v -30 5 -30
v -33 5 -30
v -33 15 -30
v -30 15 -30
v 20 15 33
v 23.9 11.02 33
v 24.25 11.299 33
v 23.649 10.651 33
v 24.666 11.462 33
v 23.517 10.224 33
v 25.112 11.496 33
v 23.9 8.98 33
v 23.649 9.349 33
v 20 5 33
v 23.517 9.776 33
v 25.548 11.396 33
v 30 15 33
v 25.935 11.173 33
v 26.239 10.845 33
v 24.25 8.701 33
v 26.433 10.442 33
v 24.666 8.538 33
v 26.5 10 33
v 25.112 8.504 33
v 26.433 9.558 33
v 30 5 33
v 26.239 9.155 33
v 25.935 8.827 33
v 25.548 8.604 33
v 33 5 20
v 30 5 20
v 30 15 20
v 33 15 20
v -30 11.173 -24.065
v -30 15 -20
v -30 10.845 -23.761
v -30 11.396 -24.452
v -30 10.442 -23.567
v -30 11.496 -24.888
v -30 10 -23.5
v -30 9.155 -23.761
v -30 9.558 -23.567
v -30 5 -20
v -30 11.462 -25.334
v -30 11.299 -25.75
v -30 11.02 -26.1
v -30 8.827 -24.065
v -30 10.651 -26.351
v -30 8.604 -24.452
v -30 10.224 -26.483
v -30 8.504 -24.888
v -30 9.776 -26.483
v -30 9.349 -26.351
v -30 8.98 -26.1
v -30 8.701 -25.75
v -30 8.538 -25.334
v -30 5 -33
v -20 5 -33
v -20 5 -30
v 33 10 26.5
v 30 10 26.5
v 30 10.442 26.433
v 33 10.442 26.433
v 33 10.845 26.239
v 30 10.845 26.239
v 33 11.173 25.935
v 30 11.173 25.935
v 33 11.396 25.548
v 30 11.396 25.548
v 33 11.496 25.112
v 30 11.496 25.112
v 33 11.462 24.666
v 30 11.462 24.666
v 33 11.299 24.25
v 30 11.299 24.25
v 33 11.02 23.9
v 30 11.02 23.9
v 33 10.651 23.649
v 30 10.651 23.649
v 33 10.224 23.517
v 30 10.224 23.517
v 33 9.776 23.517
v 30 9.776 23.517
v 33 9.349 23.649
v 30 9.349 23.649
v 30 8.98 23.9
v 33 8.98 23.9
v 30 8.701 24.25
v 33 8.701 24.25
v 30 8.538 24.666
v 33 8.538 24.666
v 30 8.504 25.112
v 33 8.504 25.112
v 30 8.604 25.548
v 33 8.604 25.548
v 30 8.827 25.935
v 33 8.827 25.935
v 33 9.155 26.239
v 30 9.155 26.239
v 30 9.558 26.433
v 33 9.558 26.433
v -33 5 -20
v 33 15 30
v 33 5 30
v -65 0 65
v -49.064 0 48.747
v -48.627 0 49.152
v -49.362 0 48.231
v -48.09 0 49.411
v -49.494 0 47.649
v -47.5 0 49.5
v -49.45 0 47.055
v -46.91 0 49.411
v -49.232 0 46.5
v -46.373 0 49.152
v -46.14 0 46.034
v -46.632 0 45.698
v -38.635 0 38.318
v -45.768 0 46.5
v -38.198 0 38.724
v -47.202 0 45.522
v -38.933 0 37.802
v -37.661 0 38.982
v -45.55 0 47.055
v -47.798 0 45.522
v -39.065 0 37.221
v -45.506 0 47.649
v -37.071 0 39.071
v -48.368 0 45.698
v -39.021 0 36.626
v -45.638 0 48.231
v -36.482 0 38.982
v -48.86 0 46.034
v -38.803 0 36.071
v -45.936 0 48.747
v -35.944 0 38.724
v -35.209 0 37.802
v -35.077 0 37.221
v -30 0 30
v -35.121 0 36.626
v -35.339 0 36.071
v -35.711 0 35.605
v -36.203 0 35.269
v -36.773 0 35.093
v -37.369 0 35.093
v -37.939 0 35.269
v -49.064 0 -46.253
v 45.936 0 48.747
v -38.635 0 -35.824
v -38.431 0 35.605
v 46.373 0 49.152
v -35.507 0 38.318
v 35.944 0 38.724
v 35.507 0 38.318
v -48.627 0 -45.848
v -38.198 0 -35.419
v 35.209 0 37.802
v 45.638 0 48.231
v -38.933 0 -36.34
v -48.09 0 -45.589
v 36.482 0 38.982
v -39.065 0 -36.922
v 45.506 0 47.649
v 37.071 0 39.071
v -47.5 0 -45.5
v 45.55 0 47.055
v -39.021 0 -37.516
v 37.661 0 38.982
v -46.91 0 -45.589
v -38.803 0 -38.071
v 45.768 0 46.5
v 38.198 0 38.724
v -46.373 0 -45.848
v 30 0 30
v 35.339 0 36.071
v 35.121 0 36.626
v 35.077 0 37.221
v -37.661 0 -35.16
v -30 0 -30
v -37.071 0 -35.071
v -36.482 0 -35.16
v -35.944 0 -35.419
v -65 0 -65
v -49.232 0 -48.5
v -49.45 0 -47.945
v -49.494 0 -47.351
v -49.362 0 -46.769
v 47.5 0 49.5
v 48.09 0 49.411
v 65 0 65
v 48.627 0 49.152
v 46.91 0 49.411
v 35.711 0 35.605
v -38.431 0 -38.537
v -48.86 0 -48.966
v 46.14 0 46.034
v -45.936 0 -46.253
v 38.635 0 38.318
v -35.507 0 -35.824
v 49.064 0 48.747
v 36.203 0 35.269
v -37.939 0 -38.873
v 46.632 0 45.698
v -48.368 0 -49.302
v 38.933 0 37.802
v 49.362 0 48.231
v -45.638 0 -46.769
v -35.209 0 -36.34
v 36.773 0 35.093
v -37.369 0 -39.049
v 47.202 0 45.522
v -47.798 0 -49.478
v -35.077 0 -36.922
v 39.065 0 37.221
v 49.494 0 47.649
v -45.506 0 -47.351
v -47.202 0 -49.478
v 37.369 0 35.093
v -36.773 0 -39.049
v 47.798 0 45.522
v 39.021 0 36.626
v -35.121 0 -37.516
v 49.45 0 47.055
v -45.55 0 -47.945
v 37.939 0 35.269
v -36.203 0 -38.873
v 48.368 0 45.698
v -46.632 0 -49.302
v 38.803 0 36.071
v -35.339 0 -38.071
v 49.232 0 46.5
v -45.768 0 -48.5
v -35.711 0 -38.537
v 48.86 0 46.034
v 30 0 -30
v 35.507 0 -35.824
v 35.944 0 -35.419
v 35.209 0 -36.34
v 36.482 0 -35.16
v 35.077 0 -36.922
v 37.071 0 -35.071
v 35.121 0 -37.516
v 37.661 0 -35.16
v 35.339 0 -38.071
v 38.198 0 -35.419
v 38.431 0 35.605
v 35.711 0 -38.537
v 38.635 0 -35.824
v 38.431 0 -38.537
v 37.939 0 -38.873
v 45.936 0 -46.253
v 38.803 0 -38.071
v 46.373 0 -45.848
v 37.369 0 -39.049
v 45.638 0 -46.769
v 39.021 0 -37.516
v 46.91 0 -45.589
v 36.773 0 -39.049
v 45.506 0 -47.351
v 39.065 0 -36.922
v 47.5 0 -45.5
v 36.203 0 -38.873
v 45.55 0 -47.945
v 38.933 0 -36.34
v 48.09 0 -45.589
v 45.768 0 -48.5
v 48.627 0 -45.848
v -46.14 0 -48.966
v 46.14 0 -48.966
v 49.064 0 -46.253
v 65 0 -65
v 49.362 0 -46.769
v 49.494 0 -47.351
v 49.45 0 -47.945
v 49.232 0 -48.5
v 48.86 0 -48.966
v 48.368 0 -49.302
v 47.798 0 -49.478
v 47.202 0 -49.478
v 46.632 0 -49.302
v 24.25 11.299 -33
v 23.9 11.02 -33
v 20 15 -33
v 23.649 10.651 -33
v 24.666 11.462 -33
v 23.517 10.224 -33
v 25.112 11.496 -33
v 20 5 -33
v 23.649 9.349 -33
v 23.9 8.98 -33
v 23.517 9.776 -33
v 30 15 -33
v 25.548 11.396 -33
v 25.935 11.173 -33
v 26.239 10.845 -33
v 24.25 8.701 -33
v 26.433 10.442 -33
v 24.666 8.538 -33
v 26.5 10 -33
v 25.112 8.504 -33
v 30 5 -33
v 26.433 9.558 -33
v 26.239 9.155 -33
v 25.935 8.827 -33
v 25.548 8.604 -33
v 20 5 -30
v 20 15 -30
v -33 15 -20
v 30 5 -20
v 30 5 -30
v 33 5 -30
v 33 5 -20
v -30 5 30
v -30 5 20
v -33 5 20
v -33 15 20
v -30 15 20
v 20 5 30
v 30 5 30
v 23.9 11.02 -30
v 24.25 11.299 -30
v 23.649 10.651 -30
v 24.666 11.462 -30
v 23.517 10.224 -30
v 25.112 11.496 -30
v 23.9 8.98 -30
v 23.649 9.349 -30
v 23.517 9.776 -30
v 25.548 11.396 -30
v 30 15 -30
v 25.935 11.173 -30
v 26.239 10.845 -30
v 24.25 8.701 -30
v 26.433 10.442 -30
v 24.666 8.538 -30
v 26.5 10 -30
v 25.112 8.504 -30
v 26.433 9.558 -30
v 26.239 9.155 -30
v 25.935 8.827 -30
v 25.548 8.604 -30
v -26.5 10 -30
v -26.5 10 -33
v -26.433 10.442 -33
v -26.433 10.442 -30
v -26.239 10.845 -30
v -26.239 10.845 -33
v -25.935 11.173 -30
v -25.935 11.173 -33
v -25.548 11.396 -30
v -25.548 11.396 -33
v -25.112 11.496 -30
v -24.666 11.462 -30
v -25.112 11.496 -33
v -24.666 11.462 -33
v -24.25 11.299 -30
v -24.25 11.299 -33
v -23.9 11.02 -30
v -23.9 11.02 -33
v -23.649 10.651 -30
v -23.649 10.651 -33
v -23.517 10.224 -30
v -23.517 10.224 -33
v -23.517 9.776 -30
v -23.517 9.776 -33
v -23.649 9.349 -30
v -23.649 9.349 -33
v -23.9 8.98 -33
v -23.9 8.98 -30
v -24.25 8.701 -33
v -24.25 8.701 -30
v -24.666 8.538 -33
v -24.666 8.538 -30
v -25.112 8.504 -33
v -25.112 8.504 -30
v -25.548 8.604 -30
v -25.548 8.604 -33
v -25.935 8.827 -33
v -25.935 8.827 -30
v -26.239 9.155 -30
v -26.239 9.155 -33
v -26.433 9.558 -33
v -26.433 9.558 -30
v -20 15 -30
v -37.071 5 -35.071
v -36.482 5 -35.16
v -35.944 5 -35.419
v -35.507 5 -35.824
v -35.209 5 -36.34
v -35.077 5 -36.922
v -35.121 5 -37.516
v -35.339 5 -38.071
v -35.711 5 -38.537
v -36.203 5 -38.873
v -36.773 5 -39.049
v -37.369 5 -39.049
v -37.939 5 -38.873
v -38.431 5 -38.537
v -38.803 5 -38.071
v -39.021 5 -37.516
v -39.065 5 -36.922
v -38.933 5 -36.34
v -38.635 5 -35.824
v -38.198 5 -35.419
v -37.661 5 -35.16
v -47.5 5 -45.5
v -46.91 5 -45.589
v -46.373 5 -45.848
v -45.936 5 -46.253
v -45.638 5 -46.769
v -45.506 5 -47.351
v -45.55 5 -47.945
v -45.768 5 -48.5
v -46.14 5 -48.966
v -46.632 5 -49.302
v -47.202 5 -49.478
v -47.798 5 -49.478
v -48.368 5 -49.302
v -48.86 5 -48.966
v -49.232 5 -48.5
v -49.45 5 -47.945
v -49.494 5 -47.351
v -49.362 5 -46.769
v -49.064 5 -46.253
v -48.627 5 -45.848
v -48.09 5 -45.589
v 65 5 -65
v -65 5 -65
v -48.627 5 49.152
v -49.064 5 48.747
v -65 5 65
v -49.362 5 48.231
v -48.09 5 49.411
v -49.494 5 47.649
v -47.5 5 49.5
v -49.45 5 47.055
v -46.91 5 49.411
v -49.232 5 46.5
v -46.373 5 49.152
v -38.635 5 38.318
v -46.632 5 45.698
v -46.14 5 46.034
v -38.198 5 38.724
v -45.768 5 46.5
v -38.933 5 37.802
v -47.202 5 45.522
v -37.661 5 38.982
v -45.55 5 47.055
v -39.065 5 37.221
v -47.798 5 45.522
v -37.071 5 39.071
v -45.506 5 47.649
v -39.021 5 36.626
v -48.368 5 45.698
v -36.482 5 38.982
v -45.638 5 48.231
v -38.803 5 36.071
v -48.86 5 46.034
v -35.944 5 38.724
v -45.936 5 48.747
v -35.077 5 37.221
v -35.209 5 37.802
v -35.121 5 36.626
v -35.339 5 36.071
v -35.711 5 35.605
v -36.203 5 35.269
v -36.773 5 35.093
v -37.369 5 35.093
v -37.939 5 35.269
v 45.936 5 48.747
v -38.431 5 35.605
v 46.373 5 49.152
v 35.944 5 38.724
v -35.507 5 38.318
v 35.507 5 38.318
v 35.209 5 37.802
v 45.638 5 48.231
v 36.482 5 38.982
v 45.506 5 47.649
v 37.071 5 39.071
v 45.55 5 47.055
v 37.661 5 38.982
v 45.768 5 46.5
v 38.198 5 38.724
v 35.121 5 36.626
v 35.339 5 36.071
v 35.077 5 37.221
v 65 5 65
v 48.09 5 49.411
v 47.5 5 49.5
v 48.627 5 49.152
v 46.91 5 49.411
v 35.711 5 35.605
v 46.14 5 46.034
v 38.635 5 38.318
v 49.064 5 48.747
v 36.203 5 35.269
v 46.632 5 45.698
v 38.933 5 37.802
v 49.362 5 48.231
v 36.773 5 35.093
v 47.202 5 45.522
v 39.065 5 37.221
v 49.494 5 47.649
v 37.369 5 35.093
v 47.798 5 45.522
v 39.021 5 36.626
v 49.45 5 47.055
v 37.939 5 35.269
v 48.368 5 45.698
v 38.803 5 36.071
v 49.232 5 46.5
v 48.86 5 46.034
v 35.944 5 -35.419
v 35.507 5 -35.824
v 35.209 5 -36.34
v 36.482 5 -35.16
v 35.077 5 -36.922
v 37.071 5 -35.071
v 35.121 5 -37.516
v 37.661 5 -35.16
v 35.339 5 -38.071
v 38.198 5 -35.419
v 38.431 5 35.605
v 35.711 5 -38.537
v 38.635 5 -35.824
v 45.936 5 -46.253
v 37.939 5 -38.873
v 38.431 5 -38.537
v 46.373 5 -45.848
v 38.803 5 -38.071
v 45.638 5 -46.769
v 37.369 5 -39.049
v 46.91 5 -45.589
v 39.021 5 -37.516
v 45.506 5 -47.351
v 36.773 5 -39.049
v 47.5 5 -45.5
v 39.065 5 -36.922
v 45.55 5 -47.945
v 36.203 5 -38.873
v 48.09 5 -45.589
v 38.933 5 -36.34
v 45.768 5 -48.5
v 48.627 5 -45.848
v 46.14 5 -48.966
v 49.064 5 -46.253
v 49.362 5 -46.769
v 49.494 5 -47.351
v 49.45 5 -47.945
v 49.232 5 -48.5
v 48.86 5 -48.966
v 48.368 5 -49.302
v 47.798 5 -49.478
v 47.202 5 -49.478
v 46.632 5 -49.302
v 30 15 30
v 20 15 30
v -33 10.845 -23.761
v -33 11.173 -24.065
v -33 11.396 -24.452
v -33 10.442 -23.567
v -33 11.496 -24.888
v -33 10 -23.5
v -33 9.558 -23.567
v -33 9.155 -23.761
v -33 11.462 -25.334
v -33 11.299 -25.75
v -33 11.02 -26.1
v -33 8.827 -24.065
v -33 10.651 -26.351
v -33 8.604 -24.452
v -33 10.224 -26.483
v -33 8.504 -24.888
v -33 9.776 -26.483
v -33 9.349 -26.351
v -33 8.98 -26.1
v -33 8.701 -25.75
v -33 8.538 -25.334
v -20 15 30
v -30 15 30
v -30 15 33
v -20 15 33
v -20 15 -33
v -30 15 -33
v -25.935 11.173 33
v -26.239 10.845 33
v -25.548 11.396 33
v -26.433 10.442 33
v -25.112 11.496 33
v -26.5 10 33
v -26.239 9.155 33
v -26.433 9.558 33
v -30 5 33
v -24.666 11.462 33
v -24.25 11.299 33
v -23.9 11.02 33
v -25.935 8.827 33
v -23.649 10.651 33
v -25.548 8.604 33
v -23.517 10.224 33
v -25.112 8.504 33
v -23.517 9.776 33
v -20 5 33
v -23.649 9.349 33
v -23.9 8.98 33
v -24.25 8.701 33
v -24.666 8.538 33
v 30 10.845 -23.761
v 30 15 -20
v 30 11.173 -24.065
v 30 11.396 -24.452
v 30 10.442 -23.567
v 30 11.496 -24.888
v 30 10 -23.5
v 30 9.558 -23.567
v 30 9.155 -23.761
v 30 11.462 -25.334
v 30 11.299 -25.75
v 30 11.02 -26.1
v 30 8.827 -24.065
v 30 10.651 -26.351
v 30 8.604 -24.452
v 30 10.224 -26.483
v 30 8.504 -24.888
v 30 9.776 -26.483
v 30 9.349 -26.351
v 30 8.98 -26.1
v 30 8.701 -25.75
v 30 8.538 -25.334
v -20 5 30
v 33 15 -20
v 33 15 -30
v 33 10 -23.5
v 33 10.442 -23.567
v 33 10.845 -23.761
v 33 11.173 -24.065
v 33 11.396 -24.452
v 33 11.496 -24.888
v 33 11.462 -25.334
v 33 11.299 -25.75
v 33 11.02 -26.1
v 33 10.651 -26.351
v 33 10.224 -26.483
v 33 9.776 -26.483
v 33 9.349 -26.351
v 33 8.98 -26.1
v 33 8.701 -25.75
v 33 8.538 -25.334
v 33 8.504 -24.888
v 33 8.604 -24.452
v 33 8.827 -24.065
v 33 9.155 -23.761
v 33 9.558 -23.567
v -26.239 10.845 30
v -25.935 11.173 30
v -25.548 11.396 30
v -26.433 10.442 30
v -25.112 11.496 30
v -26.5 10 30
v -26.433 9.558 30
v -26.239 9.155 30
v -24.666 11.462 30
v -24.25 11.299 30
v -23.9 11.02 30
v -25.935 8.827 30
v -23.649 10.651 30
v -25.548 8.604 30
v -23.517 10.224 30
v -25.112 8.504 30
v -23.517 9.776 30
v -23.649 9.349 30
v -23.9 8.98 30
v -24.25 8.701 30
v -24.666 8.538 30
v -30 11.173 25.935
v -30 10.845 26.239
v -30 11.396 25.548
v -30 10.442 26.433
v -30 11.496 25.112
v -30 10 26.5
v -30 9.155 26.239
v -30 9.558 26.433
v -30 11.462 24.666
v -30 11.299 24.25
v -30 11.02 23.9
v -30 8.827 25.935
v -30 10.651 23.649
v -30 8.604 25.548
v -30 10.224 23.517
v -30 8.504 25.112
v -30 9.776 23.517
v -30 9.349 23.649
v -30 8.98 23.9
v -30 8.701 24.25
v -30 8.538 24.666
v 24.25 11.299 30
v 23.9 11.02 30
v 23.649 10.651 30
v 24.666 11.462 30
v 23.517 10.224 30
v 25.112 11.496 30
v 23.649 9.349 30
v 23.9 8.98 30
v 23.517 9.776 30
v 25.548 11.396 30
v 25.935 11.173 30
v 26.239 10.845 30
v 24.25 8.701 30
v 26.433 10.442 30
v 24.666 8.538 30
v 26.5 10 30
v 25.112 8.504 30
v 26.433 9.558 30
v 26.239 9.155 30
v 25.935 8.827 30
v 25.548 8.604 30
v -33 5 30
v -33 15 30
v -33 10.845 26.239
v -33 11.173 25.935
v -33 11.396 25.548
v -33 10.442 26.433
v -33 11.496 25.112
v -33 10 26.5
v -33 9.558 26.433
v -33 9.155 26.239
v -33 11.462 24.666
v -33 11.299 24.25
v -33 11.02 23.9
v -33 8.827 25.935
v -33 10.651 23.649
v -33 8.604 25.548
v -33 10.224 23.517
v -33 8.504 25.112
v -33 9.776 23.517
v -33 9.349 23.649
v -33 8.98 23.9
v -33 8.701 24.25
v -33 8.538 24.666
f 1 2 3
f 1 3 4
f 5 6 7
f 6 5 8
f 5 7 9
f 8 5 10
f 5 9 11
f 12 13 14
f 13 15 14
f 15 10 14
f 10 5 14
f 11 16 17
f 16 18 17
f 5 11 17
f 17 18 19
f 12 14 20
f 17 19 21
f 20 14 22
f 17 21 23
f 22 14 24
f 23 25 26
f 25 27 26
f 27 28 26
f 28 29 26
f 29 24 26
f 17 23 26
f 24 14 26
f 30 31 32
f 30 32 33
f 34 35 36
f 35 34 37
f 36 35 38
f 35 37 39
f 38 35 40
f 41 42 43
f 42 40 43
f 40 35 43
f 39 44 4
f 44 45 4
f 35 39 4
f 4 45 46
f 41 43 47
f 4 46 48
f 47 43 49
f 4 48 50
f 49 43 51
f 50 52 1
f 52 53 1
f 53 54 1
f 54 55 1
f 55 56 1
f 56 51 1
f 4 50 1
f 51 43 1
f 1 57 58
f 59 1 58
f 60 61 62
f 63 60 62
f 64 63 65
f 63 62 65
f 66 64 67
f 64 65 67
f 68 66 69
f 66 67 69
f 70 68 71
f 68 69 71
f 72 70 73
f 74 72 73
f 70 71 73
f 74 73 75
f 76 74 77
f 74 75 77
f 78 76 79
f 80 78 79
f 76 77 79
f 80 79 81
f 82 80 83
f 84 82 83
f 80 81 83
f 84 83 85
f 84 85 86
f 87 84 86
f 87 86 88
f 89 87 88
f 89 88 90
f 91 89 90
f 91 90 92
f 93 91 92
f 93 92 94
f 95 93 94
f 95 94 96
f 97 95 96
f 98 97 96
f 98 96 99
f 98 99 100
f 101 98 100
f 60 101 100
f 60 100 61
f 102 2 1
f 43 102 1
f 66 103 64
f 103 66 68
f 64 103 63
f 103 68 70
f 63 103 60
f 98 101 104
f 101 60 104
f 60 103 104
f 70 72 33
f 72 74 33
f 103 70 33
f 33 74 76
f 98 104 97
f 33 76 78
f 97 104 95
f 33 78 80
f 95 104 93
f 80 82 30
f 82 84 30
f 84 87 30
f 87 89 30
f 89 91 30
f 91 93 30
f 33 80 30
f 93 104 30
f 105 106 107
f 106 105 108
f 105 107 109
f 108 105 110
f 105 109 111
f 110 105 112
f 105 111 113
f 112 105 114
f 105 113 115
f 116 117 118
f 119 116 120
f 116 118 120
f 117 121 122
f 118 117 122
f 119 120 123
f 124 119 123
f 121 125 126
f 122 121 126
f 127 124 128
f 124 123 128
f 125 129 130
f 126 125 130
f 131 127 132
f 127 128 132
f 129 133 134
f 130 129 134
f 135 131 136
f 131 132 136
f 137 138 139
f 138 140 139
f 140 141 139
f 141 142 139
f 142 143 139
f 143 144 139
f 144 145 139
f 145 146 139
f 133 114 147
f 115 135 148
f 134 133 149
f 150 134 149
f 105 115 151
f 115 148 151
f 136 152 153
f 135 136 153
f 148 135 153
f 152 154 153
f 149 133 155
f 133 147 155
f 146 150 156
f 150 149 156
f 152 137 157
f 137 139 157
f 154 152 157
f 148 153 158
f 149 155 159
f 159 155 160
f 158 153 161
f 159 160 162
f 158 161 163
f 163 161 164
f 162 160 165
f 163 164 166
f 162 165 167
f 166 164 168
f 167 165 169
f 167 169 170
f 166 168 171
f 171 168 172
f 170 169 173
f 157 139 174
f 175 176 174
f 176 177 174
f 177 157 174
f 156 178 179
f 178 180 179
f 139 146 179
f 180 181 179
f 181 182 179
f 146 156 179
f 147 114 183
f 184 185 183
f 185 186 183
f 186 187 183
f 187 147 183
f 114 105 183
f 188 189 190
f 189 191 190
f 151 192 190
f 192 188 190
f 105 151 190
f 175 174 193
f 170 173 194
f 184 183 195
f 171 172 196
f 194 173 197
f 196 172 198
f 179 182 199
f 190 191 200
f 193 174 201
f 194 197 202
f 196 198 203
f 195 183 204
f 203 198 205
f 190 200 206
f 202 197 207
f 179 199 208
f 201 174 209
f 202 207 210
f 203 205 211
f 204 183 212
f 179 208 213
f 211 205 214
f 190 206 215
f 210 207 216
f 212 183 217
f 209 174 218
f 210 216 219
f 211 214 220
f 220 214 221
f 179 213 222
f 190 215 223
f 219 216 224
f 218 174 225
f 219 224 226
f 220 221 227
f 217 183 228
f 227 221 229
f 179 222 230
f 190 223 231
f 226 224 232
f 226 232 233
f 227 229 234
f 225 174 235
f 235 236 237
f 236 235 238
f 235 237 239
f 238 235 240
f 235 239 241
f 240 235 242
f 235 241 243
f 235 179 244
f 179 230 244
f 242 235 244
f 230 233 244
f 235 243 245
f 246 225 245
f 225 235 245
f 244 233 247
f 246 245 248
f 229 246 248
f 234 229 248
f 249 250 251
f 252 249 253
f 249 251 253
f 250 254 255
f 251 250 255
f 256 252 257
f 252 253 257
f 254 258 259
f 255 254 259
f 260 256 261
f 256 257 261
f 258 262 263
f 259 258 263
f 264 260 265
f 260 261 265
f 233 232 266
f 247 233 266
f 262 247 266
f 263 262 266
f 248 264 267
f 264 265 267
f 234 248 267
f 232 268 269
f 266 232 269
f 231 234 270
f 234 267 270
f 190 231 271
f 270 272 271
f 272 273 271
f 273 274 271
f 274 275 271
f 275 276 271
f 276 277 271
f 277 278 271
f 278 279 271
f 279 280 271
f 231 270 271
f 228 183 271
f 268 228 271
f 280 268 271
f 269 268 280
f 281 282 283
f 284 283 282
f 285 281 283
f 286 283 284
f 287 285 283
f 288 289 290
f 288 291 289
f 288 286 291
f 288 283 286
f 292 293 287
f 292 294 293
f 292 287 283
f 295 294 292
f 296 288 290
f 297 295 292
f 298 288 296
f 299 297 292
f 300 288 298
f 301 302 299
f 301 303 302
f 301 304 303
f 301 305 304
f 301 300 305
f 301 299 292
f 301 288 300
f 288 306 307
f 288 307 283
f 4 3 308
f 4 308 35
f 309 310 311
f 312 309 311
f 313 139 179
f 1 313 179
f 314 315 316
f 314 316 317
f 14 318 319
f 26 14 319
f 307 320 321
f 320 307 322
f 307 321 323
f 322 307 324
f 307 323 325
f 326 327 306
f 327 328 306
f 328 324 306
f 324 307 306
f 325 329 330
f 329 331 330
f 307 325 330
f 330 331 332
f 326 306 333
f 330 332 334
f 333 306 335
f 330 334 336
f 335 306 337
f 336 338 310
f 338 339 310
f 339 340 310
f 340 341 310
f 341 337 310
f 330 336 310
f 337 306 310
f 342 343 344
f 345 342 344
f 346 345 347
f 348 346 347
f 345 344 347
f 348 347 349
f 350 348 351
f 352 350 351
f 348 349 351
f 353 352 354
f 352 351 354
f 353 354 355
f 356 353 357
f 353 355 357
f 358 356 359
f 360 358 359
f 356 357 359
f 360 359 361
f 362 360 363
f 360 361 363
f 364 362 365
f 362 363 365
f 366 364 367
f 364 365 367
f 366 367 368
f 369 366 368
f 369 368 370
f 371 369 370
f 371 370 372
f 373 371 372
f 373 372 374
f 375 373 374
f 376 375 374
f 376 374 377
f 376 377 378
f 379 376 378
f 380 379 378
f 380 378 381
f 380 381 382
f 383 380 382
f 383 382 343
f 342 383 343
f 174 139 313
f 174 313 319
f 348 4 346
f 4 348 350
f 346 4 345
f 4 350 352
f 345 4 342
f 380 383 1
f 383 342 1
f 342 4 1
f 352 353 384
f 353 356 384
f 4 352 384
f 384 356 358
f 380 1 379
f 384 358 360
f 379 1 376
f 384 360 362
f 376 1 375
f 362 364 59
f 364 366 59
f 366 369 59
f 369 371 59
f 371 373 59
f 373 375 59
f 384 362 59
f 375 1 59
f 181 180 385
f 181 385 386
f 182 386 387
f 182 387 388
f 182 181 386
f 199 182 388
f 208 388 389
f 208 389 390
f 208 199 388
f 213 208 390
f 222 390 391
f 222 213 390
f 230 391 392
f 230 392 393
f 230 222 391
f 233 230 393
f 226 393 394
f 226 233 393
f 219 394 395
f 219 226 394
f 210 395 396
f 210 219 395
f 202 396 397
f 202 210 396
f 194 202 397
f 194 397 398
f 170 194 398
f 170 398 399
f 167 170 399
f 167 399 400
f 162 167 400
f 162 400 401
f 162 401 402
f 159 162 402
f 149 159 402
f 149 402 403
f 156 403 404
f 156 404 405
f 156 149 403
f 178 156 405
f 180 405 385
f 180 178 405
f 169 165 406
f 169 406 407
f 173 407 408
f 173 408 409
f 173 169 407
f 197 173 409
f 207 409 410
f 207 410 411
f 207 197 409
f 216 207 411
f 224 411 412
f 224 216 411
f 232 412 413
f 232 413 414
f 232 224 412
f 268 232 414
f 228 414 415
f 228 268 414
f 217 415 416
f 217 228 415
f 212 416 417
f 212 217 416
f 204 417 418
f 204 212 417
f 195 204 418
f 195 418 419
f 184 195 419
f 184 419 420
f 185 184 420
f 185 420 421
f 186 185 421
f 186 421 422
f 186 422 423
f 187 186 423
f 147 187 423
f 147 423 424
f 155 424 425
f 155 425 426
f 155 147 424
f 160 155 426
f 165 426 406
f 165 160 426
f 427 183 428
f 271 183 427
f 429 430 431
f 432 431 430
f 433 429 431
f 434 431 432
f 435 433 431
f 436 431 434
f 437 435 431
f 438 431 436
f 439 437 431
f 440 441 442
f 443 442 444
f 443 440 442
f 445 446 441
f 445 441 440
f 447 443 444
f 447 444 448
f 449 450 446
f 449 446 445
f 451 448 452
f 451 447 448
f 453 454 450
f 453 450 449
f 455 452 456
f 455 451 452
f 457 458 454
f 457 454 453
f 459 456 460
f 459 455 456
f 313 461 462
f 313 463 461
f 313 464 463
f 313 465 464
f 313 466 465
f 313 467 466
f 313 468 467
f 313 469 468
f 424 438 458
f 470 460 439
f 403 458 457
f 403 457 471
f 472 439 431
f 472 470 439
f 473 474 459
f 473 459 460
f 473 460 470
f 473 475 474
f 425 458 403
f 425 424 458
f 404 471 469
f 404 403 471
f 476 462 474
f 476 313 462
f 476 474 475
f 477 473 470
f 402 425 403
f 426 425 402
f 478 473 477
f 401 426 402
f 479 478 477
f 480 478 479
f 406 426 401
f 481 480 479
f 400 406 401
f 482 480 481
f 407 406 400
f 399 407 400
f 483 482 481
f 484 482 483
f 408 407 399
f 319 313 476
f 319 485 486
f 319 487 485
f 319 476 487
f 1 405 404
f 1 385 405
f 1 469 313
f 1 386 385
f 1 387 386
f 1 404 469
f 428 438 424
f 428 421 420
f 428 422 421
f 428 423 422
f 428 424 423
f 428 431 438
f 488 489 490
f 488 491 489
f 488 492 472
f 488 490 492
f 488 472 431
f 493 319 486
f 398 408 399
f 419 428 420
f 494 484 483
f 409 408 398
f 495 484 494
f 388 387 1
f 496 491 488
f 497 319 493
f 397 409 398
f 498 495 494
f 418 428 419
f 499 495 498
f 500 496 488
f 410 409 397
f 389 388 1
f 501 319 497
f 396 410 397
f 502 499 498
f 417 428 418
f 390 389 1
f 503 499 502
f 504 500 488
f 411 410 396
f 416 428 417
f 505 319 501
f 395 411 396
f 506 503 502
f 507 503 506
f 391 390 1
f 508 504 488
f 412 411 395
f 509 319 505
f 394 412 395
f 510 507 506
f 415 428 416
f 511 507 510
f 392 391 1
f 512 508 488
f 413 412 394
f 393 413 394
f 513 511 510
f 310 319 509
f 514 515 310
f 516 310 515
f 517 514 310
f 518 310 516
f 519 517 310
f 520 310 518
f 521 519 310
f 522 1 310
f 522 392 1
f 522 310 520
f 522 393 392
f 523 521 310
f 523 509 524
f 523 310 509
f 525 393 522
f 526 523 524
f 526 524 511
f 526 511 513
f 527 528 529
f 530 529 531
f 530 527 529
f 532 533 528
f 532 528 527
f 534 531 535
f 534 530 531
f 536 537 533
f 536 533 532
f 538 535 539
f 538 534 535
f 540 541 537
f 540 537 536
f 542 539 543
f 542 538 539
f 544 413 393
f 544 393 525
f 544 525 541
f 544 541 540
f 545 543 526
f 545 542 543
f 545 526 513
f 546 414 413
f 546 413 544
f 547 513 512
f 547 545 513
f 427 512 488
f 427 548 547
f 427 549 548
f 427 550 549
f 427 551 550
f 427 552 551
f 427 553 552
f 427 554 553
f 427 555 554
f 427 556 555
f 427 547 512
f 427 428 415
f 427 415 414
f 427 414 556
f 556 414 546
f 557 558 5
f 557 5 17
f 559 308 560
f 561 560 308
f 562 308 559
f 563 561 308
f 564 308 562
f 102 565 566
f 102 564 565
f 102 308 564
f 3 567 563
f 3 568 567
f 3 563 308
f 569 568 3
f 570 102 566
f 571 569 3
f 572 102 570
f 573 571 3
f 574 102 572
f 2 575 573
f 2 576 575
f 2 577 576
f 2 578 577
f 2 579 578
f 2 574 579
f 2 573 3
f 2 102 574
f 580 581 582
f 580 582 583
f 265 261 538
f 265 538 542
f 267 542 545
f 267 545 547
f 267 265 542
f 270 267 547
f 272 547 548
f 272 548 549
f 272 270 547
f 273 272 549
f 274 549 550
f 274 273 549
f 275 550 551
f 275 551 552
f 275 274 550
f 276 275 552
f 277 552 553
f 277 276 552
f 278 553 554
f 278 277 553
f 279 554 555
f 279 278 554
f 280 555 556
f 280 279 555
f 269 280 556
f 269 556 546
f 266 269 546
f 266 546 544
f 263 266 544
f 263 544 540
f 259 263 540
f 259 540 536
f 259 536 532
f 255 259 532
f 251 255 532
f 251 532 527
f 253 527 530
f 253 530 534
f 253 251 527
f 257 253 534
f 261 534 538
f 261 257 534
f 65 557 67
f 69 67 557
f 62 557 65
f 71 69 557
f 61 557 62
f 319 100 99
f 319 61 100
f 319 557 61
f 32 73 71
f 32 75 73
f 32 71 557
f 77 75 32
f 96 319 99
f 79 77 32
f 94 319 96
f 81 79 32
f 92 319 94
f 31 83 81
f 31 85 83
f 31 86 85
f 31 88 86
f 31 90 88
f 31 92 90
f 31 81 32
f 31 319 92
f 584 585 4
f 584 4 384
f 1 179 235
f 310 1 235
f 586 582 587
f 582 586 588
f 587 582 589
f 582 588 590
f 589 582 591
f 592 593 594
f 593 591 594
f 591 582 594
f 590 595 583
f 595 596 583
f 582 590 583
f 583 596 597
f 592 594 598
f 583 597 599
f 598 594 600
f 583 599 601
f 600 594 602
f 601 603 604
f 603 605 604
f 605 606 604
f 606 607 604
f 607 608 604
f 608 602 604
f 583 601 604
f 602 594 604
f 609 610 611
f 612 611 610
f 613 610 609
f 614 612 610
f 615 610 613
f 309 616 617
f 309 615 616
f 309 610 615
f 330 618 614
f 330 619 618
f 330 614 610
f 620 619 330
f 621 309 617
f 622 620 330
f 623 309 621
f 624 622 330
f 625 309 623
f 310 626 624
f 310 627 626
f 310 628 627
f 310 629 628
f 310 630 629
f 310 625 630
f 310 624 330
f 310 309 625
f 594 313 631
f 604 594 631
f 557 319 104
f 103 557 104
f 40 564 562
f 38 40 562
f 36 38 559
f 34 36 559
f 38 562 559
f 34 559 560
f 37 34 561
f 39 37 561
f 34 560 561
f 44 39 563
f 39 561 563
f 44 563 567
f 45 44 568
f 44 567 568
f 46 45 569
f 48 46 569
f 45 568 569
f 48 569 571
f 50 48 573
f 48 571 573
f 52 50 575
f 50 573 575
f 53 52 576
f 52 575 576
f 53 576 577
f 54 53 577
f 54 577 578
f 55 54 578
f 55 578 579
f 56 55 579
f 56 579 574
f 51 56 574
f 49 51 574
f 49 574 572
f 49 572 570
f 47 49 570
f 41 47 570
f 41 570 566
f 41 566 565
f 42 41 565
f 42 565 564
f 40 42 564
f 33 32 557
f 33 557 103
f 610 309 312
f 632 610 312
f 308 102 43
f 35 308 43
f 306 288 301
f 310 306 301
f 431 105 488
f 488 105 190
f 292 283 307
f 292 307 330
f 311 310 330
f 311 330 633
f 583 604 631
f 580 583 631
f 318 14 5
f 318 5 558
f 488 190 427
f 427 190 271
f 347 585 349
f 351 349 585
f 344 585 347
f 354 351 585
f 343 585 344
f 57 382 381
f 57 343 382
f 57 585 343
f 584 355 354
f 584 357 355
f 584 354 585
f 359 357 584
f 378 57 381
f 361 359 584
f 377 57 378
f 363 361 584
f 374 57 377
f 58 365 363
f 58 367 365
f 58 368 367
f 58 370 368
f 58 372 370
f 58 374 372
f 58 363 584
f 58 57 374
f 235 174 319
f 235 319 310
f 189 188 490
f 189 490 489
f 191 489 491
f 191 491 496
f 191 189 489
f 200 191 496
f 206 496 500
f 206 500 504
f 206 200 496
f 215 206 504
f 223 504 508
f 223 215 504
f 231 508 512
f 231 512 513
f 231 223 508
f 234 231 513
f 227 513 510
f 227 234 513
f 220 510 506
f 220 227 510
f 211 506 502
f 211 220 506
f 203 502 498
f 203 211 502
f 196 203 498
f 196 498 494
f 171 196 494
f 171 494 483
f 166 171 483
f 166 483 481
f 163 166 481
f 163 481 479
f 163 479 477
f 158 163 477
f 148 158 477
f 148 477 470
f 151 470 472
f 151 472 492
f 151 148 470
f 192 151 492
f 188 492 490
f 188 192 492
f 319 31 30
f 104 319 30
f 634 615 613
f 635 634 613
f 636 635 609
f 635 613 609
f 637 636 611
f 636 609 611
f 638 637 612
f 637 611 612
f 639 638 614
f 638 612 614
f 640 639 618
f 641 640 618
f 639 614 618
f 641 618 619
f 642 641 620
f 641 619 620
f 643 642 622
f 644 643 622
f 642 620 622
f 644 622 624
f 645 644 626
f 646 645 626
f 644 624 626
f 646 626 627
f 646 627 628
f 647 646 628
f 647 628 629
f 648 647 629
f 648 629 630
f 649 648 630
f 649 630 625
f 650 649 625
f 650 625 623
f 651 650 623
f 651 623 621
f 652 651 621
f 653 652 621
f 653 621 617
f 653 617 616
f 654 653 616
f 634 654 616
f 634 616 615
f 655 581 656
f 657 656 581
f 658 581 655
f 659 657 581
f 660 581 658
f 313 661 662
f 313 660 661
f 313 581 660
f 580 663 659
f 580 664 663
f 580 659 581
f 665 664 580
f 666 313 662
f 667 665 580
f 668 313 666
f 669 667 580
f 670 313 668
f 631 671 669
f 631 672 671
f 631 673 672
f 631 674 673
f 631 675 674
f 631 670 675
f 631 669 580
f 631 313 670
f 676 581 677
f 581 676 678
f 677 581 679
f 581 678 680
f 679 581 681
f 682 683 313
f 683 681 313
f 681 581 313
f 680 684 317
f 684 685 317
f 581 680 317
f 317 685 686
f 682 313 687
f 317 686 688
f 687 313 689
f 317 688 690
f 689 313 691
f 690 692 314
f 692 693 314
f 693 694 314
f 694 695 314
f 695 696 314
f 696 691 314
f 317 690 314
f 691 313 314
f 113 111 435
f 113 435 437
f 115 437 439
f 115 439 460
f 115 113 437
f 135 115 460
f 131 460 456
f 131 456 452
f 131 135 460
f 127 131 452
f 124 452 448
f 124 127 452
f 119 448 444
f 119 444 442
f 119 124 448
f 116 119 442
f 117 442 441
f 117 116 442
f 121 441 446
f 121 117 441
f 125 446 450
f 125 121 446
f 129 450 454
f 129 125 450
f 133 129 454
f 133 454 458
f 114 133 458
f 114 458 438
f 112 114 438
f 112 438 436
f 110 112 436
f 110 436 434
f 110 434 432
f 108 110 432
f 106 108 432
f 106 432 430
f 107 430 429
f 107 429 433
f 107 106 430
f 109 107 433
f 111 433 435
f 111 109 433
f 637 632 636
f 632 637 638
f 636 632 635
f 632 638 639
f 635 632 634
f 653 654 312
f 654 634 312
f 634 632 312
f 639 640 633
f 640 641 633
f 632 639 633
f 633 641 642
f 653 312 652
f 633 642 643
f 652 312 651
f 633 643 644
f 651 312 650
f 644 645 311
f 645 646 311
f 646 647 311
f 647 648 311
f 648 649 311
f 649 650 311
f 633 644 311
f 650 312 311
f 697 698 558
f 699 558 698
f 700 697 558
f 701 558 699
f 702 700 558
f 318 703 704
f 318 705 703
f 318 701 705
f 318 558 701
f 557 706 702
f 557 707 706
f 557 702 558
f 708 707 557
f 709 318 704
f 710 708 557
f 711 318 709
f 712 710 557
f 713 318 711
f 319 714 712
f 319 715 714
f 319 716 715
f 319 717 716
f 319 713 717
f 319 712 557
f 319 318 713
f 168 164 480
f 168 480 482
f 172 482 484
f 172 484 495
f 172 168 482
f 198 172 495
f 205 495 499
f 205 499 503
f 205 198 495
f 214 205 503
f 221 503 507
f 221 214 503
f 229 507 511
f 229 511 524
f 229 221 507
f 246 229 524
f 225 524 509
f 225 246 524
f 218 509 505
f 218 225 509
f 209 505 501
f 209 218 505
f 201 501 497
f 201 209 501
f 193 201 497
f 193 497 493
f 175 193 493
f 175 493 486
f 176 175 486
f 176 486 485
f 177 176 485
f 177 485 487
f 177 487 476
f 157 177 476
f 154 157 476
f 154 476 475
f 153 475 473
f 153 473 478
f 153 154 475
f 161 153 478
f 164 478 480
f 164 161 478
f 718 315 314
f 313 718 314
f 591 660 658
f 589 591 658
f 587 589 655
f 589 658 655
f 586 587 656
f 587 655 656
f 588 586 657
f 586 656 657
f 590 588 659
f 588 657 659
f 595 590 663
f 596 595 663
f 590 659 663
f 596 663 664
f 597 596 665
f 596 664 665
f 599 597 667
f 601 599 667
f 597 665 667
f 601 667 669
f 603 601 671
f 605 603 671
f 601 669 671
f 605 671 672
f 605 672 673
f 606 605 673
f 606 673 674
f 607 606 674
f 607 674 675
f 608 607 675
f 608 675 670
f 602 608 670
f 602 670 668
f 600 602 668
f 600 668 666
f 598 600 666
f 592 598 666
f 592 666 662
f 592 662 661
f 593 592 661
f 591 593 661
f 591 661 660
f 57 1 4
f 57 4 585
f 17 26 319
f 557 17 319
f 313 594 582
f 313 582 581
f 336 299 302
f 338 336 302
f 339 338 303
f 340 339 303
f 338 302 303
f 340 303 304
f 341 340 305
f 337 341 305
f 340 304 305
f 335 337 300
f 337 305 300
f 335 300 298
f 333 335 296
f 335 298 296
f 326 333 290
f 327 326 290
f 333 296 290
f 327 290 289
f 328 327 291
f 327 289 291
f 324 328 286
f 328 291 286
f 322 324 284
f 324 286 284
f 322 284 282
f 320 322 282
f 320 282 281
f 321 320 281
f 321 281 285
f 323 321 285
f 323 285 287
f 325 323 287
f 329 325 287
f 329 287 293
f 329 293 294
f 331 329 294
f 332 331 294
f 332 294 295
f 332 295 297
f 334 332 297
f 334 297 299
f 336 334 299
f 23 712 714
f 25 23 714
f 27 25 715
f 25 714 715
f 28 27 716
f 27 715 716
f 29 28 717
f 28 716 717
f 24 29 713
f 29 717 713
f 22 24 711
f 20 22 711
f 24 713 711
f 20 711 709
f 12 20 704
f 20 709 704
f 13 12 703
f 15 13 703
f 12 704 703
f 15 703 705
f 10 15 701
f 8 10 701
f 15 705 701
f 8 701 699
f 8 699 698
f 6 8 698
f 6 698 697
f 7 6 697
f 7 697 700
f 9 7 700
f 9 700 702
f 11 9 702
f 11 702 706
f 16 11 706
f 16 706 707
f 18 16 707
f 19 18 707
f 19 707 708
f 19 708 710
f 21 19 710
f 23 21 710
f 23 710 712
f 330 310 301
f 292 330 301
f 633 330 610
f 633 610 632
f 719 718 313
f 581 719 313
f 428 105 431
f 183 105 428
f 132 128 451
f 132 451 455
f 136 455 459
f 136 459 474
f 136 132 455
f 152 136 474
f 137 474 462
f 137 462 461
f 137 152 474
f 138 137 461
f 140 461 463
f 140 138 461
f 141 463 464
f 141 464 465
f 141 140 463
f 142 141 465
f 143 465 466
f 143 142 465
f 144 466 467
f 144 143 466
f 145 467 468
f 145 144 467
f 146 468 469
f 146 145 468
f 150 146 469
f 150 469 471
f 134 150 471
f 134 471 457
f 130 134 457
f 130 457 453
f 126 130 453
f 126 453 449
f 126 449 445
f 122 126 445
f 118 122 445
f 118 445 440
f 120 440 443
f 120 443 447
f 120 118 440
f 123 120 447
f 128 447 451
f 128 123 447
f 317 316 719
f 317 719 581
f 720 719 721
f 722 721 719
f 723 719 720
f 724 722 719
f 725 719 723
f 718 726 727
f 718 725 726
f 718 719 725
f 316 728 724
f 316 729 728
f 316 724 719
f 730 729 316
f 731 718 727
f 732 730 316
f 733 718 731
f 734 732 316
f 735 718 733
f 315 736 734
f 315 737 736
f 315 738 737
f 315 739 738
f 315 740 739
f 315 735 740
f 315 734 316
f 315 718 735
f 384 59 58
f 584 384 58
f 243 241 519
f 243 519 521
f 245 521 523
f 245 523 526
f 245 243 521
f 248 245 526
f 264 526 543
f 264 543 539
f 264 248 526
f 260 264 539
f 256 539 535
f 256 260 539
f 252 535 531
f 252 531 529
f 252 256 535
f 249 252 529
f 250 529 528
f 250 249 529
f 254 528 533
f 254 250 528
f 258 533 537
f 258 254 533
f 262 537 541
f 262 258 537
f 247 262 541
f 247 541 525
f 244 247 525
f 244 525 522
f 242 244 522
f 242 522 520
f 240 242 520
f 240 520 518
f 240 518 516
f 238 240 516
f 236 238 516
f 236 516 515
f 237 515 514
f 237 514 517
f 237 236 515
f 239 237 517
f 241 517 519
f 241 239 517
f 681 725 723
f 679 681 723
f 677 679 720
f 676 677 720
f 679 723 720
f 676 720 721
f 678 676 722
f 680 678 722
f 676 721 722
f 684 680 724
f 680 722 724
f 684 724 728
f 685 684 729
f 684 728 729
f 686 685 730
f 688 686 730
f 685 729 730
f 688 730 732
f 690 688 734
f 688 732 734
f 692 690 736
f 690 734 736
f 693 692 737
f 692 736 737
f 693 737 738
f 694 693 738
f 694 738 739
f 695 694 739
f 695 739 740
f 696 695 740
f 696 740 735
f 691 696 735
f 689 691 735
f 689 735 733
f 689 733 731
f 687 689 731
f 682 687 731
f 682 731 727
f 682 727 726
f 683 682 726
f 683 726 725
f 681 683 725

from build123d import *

# Parameters (mm, degrees)
SKETCH1_W              = 130
SKETCH1_H              = 130
SKETCH1_R              = 2
SKETCH1_W_2            = 60
SKETCH1_H_2            = 60
BOSS_EXTRUDE1_DEPTH    = 5
SKETCH2_W              = 3
SKETCH2_H              = 10
BOSS_EXTRUDE10_DEPTH   = 10
SKETCH2_W_2            = 10
SKETCH2_H_2            = 3
BOSS_EXTRUDE10_2_DEPTH = 10
BOSS_EXTRUDE10_3_DEPTH = 10
BOSS_EXTRUDE10_4_DEPTH = 10
BOSS_EXTRUDE10_5_DEPTH = 10
BOSS_EXTRUDE10_6_DEPTH = 10
BOSS_EXTRUDE10_7_DEPTH = 10
BOSS_EXTRUDE10_8_DEPTH = 10
SKETCH4_R              = 1.5
CUT_EXTRUDE1_DEPTH     = 82
SKETCH5_R              = 1.5
CUT_EXTRUDE2_DEPTH     = 82


with BuildPart() as part:
    # Sketch1 → Boss-Extrude1 (new body)
    with BuildSketch(Plane(origin=(0, 0, 0), x_dir=(1, 0, 0), z_dir=(0, 1, 0))):
        Rectangle(SKETCH1_W, SKETCH1_H)
        with Locations(Location((-47.5, 47.5, 0), (0, 0, 270))):
            Circle(SKETCH1_R, mode=Mode.SUBTRACT)
        with Locations(Location((-47.5, -47.5, 0), (0, 0, 270))):
            Circle(SKETCH1_R, mode=Mode.SUBTRACT)
        with Locations(Location((47.5, -47.5, 0), (0, 0, 270))):
            Circle(SKETCH1_R, mode=Mode.SUBTRACT)
        with Locations(Location((47.5, 47.5, 0), (0, 0, 270))):
            Circle(SKETCH1_R, mode=Mode.SUBTRACT)
        with Locations(Location((37.071067812, -37.071067812, 0), (0, 0, 270))):
            Circle(SKETCH1_R, mode=Mode.SUBTRACT)
        with Locations(Location((-37.071067812, -37.071067812, 0), (0, 0, 270))):
            Circle(SKETCH1_R, mode=Mode.SUBTRACT)
        with Locations(Location((-37.071067812, 37.071067812, 0), (0, 0, 270))):
            Circle(SKETCH1_R, mode=Mode.SUBTRACT)
        with Locations(Location((37.071067812, 37.071067812, 0), (0, 0, 270))):
            Circle(SKETCH1_R, mode=Mode.SUBTRACT)
        Rectangle(SKETCH1_W_2, SKETCH1_H_2, mode=Mode.SUBTRACT)
    extrude(amount=BOSS_EXTRUDE1_DEPTH)


with BuildPart() as body_2:
    # Sketch2 → Boss-Extrude10 (new body)
    with BuildSketch(Plane(origin=(0, 5, 0), x_dir=(1, 0, 0), z_dir=(0, 1, 0))):
        with Locations((-31.5, 25)):
            Rectangle(SKETCH2_W, SKETCH2_H)
    extrude(amount=BOSS_EXTRUDE10_DEPTH)


with BuildPart() as body_3:
    # Sketch2 → Boss-Extrude10 2 (new body)
    with BuildSketch(Plane(origin=(0, 5, 0), x_dir=(1, 0, 0), z_dir=(0, 1, 0))):
        with Locations((-25, 31.5)):
            Rectangle(SKETCH2_W_2, SKETCH2_H_2)
    extrude(amount=BOSS_EXTRUDE10_2_DEPTH)


with BuildPart() as body_4:
    # Sketch2 → Boss-Extrude10 3 (new body)
    with BuildSketch(Plane(origin=(0, 5, 0), x_dir=(1, 0, 0), z_dir=(0, 1, 0))):
        with Locations((25, 31.5)):
            Rectangle(SKETCH2_W_2, SKETCH2_H_2)
    extrude(amount=BOSS_EXTRUDE10_3_DEPTH)


with BuildPart() as body_5:
    # Sketch2 → Boss-Extrude10 4 (new body)
    with BuildSketch(Plane(origin=(0, 5, 0), x_dir=(1, 0, 0), z_dir=(0, 1, 0))):
        with Locations((25, -31.5)):
            Rectangle(SKETCH2_W_2, SKETCH2_H_2)
    extrude(amount=BOSS_EXTRUDE10_4_DEPTH)


with BuildPart() as body_6:
    # Sketch2 → Boss-Extrude10 5 (new body)
    with BuildSketch(Plane(origin=(0, 5, 0), x_dir=(1, 0, 0), z_dir=(0, 1, 0))):
        with Locations((31.5, 25)):
            Rectangle(SKETCH2_W, SKETCH2_H)
    extrude(amount=BOSS_EXTRUDE10_5_DEPTH)


with BuildPart() as body_7:
    # Sketch2 → Boss-Extrude10 6 (new body)
    with BuildSketch(Plane(origin=(0, 5, 0), x_dir=(1, 0, 0), z_dir=(0, 1, 0))):
        with Locations((-25, -31.5)):
            Rectangle(SKETCH2_W_2, SKETCH2_H_2)
    extrude(amount=BOSS_EXTRUDE10_6_DEPTH)


with BuildPart() as body_8:
    # Sketch2 → Boss-Extrude10 7 (new body)
    with BuildSketch(Plane(origin=(0, 5, 0), x_dir=(1, 0, 0), z_dir=(0, 1, 0))):
        with Locations((-31.5, -25)):
            Rectangle(SKETCH2_W, SKETCH2_H)
    extrude(amount=BOSS_EXTRUDE10_7_DEPTH)


with BuildPart() as body_9:
    # Sketch2 → Boss-Extrude10 8 (new body)
    with BuildSketch(Plane(origin=(0, 5, 0), x_dir=(1, 0, 0), z_dir=(0, 1, 0))):
        with Locations((31.5, -25)):
            Rectangle(SKETCH2_W, SKETCH2_H)
    extrude(amount=BOSS_EXTRUDE10_8_DEPTH)


with BuildPart() as cut_extrude1_tool:
    # Sketch4 → Cut-Extrude1 (new body)
    with BuildSketch(Plane.ZY.offset(33)):
        with Locations((-25, 10)):
            Circle(SKETCH4_R)
        with Locations((25, 10)):
            Circle(SKETCH4_R)
    extrude(amount=-CUT_EXTRUDE1_DEPTH)


with BuildPart() as body_2_1:
    add(body_2.part)

    # Cut-Extrude1: cut by cut_extrude1_tool
    add(cut_extrude1_tool.part, mode=Mode.SUBTRACT)


with BuildPart() as body_6_1:
    add(body_6.part)

    # Cut-Extrude1: cut by cut_extrude1_tool
    add(cut_extrude1_tool.part, mode=Mode.SUBTRACT)


with BuildPart() as body_8_1:
    add(body_8.part)

    # Cut-Extrude1: cut by cut_extrude1_tool
    add(cut_extrude1_tool.part, mode=Mode.SUBTRACT)


with BuildPart() as body_9_1:
    add(body_9.part)

    # Cut-Extrude1: cut by cut_extrude1_tool
    add(cut_extrude1_tool.part, mode=Mode.SUBTRACT)


with BuildPart() as cut_extrude2_tool:
    # Sketch5 → Cut-Extrude2 (new body)
    with BuildSketch(Plane(origin=(0, 0, -33), x_dir=(-1, 0, 0), z_dir=(0, 0, -1))):
        with Locations(Location((-25, 10, 0), (0, 0, 180))):
            Circle(SKETCH5_R)
        with Locations((25, 10)):
            Circle(SKETCH5_R)
    extrude(amount=-CUT_EXTRUDE2_DEPTH)


with BuildPart() as body_3_1:
    add(body_3.part)

    # Cut-Extrude2: cut by cut_extrude2_tool
    add(cut_extrude2_tool.part, mode=Mode.SUBTRACT)


with BuildPart() as body_4_1:
    add(body_4.part)

    # Cut-Extrude2: cut by cut_extrude2_tool
    add(cut_extrude2_tool.part, mode=Mode.SUBTRACT)


with BuildPart() as body_5_1:
    add(body_5.part)

    # Cut-Extrude2: cut by cut_extrude2_tool
    add(cut_extrude2_tool.part, mode=Mode.SUBTRACT)


with BuildPart() as body_7_1:
    add(body_7.part)

    # Cut-Extrude2: cut by cut_extrude2_tool
    add(cut_extrude2_tool.part, mode=Mode.SUBTRACT)


solid = Compound([part.part, body_2_1.part, body_6_1.part, body_8_1.part, body_9_1.part, body_3_1.part, body_4_1.part, body_5_1.part, body_7_1.part])
